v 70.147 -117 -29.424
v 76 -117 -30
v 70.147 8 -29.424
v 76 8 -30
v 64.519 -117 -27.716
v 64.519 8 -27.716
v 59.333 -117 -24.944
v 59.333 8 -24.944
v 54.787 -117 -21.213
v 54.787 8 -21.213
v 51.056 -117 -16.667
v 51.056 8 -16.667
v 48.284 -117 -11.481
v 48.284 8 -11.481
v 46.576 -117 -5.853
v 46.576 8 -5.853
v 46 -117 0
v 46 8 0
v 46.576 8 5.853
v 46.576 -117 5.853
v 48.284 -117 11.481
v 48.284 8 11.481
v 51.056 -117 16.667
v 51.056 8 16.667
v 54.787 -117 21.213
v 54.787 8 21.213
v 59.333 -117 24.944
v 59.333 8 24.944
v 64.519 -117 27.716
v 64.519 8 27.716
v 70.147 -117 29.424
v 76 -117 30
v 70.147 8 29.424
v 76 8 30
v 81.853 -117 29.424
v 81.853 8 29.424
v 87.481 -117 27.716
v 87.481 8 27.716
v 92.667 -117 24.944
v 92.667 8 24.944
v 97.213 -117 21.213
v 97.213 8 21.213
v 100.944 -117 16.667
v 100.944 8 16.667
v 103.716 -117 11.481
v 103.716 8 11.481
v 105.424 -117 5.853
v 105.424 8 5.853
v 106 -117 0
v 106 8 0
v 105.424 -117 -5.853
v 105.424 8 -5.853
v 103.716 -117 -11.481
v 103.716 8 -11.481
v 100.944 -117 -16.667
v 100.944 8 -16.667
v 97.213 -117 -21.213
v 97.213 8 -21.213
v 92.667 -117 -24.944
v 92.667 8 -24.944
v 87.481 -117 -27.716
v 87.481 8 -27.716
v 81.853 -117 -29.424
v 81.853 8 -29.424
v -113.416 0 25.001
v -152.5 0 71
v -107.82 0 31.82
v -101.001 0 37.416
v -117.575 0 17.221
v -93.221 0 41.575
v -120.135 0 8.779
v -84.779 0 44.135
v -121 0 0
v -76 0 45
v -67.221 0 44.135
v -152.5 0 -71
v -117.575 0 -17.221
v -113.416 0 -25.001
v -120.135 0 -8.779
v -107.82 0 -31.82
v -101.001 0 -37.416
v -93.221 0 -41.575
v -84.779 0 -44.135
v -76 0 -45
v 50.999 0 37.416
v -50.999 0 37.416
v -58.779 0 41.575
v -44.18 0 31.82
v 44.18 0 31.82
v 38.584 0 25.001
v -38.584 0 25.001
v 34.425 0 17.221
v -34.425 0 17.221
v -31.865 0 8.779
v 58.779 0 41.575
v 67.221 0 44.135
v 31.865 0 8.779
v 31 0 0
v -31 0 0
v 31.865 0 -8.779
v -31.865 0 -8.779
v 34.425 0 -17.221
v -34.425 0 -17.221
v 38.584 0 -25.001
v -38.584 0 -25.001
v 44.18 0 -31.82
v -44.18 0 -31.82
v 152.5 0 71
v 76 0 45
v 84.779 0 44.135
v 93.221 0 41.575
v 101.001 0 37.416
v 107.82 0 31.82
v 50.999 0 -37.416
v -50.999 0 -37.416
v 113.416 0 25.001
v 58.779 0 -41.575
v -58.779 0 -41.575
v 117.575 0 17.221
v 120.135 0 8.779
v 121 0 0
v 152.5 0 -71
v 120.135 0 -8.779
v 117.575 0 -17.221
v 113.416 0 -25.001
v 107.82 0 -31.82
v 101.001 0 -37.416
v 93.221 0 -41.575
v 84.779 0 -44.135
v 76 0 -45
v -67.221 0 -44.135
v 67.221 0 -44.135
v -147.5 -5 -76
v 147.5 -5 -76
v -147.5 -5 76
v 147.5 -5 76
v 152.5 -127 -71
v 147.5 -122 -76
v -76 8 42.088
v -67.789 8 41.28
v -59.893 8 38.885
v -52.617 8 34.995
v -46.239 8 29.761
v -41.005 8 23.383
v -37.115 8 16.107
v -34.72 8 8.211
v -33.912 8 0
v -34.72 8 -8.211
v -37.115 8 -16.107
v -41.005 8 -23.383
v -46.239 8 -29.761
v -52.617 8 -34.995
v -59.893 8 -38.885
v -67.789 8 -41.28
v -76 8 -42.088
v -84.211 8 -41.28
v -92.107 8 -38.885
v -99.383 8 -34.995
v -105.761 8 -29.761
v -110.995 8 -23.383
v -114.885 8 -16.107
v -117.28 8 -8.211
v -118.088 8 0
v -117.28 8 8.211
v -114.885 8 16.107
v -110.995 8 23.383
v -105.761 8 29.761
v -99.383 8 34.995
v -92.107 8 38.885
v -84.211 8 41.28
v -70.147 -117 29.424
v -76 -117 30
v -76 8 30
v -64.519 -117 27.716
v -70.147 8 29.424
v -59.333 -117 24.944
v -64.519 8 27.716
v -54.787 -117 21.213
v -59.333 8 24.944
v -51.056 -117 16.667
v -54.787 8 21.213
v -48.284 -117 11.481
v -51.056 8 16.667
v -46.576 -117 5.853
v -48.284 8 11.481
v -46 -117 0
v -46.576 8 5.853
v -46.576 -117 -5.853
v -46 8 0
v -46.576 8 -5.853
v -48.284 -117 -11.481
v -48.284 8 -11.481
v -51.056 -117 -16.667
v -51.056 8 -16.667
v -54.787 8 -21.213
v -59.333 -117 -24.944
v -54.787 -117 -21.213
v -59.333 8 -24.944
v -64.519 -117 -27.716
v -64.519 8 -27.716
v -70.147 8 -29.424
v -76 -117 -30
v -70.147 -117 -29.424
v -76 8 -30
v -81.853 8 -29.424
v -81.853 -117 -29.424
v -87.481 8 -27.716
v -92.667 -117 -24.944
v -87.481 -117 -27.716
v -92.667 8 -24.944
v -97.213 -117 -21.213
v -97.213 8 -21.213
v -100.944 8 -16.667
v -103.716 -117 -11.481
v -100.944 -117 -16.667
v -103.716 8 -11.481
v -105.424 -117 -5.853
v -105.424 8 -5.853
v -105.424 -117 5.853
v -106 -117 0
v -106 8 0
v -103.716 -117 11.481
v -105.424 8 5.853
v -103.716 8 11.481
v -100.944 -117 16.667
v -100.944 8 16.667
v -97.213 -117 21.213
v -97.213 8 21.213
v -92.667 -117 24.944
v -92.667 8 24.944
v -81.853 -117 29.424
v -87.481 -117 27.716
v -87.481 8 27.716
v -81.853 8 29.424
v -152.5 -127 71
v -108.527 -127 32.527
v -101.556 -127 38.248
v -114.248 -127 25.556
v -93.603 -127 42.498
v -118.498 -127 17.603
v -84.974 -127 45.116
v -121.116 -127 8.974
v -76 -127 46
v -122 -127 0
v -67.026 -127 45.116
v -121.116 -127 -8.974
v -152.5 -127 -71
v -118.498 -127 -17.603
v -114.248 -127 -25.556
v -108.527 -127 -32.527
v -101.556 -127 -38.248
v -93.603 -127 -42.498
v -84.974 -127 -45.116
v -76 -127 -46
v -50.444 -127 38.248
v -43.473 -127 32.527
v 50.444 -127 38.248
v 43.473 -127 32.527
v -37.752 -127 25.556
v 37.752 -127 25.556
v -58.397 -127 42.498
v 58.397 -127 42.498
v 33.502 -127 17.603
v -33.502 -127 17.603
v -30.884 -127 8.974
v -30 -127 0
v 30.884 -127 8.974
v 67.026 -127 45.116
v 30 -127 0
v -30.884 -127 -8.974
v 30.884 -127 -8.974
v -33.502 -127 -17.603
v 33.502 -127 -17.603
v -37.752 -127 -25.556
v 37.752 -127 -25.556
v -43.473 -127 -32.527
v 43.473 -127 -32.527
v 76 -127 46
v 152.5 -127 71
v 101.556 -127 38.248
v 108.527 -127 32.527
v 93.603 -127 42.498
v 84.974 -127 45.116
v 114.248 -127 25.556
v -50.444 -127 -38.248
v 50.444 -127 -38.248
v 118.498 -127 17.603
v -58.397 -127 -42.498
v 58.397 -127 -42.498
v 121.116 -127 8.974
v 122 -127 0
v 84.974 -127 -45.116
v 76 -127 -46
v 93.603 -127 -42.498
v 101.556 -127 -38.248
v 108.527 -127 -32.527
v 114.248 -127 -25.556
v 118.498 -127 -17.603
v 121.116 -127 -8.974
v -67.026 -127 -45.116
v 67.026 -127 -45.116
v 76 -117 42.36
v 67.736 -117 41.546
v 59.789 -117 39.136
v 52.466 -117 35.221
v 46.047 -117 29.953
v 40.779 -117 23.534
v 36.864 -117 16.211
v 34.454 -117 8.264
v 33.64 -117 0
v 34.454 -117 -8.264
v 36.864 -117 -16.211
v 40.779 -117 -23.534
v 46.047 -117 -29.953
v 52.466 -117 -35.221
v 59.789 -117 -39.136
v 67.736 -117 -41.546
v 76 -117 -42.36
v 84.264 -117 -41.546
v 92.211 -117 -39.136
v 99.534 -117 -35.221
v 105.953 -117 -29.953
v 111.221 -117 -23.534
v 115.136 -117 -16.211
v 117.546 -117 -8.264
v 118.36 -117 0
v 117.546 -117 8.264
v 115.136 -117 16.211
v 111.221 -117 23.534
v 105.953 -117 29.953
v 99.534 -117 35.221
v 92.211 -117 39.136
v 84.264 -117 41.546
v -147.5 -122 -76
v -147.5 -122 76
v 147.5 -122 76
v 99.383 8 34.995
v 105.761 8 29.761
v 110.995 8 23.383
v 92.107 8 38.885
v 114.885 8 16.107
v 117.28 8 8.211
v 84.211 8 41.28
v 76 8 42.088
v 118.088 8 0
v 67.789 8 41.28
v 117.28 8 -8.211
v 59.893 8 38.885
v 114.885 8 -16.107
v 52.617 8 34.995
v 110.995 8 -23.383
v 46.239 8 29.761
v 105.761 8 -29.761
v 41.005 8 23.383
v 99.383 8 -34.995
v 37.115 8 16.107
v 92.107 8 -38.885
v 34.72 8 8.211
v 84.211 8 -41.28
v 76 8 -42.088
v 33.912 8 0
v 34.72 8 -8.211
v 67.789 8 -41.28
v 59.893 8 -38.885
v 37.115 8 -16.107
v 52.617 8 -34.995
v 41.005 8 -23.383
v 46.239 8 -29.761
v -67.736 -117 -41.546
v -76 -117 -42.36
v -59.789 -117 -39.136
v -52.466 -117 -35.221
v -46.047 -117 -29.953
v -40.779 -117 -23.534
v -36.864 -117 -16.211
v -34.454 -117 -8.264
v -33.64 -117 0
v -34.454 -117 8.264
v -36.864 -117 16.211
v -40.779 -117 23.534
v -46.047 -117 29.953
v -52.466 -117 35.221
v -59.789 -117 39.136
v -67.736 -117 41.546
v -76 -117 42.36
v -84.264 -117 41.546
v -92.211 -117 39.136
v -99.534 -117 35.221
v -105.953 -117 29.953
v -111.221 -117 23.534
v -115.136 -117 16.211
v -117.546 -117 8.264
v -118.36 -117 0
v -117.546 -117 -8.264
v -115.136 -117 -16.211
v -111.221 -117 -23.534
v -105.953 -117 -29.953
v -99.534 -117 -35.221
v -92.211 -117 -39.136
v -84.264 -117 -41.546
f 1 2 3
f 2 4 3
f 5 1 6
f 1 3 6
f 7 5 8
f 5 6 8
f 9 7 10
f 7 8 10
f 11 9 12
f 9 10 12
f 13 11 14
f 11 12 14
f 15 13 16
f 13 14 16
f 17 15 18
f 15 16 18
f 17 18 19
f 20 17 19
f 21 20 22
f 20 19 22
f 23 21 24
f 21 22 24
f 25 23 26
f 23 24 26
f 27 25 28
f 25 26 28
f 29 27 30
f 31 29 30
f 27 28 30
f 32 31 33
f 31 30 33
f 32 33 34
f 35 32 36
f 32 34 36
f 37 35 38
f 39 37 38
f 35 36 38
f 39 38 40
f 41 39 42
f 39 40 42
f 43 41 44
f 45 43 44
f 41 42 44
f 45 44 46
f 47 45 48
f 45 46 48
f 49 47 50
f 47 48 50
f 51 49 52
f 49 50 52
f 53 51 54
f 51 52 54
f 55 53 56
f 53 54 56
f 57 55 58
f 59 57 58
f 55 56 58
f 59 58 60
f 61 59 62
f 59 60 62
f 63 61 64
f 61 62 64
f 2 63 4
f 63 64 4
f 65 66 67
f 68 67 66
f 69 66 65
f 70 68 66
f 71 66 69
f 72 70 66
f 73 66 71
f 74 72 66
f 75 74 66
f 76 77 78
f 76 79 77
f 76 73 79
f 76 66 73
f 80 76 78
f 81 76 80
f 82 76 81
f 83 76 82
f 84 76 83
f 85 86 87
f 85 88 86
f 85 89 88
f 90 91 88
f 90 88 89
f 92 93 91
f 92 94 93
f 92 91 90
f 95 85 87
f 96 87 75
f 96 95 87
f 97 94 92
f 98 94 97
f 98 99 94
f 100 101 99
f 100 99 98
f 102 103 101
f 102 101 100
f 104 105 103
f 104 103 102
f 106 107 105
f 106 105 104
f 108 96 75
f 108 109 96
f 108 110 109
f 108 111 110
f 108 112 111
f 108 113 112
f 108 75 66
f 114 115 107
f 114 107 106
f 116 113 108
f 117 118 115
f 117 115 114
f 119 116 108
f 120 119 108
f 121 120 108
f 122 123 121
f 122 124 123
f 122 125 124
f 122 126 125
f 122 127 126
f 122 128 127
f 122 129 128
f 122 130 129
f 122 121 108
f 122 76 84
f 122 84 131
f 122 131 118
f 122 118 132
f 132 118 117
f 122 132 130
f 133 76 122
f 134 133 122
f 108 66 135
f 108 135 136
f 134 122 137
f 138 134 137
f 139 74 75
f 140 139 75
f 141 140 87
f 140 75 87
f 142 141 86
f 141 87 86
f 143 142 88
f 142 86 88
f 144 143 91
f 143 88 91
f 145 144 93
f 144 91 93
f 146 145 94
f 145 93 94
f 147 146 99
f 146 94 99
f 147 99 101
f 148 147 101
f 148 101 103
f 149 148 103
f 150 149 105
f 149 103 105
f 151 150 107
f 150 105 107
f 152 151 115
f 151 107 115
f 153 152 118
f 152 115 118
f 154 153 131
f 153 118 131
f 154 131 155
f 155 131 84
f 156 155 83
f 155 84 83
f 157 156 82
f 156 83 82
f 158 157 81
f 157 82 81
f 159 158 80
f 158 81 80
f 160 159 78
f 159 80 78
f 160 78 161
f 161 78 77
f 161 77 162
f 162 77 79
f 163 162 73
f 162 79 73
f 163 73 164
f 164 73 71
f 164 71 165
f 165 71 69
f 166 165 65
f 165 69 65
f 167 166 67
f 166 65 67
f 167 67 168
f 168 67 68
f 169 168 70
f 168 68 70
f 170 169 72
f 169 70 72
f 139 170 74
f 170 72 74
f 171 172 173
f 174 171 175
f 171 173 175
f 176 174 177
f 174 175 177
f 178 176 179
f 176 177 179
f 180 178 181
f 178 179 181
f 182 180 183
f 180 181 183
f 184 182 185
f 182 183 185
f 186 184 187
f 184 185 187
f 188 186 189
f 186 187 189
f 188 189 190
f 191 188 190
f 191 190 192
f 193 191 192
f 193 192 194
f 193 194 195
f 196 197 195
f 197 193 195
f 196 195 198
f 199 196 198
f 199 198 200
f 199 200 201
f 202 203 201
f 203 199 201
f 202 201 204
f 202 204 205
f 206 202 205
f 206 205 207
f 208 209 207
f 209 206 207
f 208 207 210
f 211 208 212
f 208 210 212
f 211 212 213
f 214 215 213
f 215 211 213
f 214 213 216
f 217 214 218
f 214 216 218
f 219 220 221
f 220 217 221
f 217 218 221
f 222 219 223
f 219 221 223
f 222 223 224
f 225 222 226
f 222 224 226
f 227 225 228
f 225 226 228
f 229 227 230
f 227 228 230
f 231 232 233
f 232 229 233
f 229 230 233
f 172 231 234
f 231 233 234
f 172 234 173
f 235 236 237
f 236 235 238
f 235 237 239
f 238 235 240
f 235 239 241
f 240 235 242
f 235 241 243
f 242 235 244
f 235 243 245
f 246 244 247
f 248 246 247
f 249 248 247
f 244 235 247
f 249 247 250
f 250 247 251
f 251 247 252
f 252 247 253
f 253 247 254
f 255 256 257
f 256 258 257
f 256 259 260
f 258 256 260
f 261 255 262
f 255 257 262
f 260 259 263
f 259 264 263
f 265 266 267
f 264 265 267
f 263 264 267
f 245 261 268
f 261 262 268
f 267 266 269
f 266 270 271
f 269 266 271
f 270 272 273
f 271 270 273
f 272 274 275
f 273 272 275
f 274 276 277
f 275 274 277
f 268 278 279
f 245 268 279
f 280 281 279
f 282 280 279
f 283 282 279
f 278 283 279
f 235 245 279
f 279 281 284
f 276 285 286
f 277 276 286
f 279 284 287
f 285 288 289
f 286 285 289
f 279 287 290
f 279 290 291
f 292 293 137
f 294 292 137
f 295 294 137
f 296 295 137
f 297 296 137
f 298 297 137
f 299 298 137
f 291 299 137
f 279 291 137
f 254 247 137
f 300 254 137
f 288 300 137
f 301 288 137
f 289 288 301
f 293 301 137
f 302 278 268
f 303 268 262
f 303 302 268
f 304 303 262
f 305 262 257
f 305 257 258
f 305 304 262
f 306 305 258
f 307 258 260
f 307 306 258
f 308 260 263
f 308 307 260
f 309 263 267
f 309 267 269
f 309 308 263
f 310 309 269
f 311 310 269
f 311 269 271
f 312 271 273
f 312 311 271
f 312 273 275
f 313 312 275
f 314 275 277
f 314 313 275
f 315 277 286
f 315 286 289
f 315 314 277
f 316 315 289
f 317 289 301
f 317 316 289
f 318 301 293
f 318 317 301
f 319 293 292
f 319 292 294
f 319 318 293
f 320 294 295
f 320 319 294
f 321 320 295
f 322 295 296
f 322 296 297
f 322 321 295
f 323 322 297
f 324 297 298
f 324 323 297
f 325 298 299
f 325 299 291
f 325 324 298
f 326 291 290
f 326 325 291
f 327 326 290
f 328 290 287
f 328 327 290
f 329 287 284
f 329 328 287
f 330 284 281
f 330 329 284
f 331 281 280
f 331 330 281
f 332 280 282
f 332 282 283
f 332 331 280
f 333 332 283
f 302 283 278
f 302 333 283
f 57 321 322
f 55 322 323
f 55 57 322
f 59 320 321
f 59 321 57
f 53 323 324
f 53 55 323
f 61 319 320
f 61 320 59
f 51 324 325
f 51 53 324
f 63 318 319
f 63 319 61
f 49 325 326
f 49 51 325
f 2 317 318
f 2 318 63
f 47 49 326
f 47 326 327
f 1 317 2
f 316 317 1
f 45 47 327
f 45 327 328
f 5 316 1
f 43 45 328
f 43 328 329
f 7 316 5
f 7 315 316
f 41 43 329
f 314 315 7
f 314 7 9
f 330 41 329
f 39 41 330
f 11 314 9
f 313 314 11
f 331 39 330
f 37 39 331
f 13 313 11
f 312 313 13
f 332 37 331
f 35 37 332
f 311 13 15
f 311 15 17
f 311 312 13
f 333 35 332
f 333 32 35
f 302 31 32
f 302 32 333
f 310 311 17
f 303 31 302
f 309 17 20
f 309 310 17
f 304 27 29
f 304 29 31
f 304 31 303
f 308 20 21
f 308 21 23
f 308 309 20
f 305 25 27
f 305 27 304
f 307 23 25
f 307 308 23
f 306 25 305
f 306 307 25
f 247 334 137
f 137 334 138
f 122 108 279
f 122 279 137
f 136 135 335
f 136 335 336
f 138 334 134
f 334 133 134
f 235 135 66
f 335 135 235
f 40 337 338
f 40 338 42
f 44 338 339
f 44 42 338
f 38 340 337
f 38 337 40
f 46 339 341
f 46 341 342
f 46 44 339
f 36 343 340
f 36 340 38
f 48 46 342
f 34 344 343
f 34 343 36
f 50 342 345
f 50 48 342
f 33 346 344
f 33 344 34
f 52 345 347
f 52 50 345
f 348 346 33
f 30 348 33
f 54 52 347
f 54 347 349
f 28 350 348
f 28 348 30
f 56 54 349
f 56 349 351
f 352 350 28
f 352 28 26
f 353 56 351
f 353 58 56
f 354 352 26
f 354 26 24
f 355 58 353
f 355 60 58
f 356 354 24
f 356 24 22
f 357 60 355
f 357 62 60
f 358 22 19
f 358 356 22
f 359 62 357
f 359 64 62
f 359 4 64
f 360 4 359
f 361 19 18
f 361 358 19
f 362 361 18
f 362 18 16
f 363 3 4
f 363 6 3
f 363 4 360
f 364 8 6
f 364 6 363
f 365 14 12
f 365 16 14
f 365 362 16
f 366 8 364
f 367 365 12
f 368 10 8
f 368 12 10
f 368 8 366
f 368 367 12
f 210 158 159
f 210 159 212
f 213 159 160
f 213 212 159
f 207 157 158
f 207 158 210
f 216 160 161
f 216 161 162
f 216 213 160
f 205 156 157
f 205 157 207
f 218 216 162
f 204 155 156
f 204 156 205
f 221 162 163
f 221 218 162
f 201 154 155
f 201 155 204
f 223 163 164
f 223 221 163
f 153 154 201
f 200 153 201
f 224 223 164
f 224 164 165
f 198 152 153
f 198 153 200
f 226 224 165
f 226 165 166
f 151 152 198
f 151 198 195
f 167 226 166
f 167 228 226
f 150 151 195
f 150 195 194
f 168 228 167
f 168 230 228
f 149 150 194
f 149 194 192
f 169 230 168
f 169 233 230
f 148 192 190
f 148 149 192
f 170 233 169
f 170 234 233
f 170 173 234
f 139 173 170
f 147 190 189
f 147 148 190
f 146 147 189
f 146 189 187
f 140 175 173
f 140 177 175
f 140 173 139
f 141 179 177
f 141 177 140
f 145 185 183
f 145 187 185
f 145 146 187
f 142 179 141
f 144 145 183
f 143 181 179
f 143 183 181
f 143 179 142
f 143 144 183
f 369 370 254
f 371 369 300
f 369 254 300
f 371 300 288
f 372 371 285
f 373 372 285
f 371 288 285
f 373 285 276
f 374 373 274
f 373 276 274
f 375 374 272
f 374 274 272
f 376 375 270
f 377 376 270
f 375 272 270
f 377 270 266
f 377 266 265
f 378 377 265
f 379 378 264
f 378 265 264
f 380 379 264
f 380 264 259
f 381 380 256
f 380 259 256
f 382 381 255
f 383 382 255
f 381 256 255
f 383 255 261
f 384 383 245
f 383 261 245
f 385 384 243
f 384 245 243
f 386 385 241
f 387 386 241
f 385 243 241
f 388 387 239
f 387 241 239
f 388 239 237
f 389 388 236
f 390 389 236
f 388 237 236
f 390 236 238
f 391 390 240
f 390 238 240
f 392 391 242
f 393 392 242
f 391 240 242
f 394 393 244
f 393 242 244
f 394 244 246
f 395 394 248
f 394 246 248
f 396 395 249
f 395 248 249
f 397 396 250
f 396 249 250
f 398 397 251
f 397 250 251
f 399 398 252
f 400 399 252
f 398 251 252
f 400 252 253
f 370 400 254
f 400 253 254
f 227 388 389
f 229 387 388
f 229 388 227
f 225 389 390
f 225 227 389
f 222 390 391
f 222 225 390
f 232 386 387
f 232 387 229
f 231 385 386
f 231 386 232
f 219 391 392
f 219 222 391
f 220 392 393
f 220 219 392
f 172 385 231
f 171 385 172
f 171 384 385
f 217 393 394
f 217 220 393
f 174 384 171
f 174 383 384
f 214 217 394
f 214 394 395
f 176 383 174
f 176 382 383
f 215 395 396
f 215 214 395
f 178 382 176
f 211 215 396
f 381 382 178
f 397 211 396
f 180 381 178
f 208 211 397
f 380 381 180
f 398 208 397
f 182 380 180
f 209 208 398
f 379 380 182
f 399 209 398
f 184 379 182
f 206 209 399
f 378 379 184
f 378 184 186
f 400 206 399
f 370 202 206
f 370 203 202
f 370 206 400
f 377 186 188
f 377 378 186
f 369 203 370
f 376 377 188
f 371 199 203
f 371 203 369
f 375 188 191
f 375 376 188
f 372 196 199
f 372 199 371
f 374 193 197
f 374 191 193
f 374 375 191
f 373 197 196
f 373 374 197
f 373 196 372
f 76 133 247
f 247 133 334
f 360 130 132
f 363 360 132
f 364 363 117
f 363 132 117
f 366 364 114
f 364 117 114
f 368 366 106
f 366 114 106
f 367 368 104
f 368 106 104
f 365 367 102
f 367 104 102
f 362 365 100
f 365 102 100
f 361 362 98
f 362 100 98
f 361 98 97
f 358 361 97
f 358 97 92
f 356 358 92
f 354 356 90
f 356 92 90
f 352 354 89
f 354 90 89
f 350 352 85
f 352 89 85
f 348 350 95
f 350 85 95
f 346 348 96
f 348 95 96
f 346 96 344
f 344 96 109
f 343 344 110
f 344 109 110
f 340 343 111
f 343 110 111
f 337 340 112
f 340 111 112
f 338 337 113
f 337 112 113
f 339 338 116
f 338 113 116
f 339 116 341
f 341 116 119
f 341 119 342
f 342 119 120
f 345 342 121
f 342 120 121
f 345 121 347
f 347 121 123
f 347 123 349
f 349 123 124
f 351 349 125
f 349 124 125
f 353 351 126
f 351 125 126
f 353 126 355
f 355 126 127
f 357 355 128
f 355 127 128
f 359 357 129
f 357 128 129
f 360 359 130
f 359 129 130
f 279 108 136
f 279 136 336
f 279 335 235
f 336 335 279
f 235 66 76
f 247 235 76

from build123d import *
from OCP.BRepFilletAPI import BRepFilletAPI_MakeChamfer

# Parameters (mm, degrees)
SKETCH1_W           = 305
SKETCH1_H           = 152
BOSS_EXTRUDE1_DEPTH = 127
SKETCH2_R           = 30
CUT_EXTRUDE1_DEPTH  = 213.51176438
BOSS_EXTRUDE2_START = 8
SKETCH3_R           = 45
SKETCH3_R_2         = 30
BOSS_EXTRUDE2_DEPTH = 8
CHAMFER1_SIZE       = 2.911761874
CHAMFER1_SIZE_2     = 8
CUT_EXTRUDE2_START  = -10
SKETCH4_R           = 46
SKETCH4_R_2         = 30
CUT_EXTRUDE2_DEPTH  = 10
CHAMFER2_SIZE       = 3.639702343
CHAMFER2_SIZE_2     = 10
CHAMFER3_SIZE       = 5


with BuildPart() as part:
    # Sketch1 → Boss-Extrude1 (new body)
    with BuildSketch(Plane(origin=(0, 0, 0), x_dir=(1, 0, 0), z_dir=(0, 1, 0))):
        Rectangle(SKETCH1_W, SKETCH1_H)
    extrude(amount=-BOSS_EXTRUDE1_DEPTH)

    # Sketch2 → Cut-Extrude1 (cut, through all)
    with BuildSketch(Plane(origin=(0, 0, 0), x_dir=(1, 0, 0), z_dir=(0, 1, 0))):
        with Locations(Location((-76, 0, 0), (0, 0, 270))):
            Circle(SKETCH2_R)
        with Locations(Location((76, 0, 0), (0, 0, 90))):
            Circle(SKETCH2_R)
    extrude(amount=-CUT_EXTRUDE1_DEPTH, mode=Mode.SUBTRACT)

    # Sketch3 → Boss-Extrude2 (add)
    # profile 1 of 2: a face of its own
    with BuildSketch(Plane(origin=(0, 0, 0), x_dir=(1, 0, 0), z_dir=(0, 1, 0)).offset(BOSS_EXTRUDE2_START)):
        with Locations(Location((-76, 0, 0), (0, 0, 270))):
            Circle(SKETCH3_R)
        with Locations(Location((-76, 0, 0), (0, 0, 270))):
            Circle(SKETCH3_R_2, mode=Mode.SUBTRACT)
    # profile 2 of 2: a face of its own
    with BuildSketch(Plane(origin=(0, 0, 0), x_dir=(1, 0, 0), z_dir=(0, 1, 0)).offset(BOSS_EXTRUDE2_START)):
        with Locations(Location((76, 0, 0), (0, 0, 90))):
            Circle(SKETCH3_R)
        with Locations(Location((76, 0, 0), (0, 0, 90))):
            Circle(SKETCH3_R_2, mode=Mode.SUBTRACT)
    extrude(amount=-BOSS_EXTRUDE2_DEPTH)

    # Chamfer1
    chamfer1_edges_1 = [part.edges().sort_by_distance(p)[0] for p in [
        (-76, 8, -45),
    ]]
    chamfer1_side_1 = [part.faces().sort_by_distance(p)[0] for p in [
        (-76, 8, -44.941764763),
    ]]
    chamfer1_edges_2 = [part.edges().sort_by_distance(p)[0] for p in [
        (76, 8, 45),
    ]]
    chamfer1_side_2 = [part.faces().sort_by_distance(p)[0] for p in [
        (76, 8, 44.941764763),
    ]]
    chamfer1 = BRepFilletAPI_MakeChamfer(part.part.solid().wrapped)
    for e in chamfer1_edges_1:
        chamfer1.Add(CHAMFER1_SIZE - 0.0001, CHAMFER1_SIZE_2 - 0.0001, e.wrapped, chamfer1_side_1[0].wrapped)
    for e in chamfer1_edges_2:
        chamfer1.Add(CHAMFER1_SIZE - 0.0001, CHAMFER1_SIZE_2 - 0.0001, e.wrapped, chamfer1_side_2[0].wrapped)
    add(Compound.cast(chamfer1.Shape()), mode=Mode.REPLACE)  # a hair under: the kernel refuses the full size

    # Sketch4 → Cut-Extrude2 (cut)
    # profile 1 of 2: a face of its own
    with BuildSketch(Plane.XZ.offset(127).offset(CUT_EXTRUDE2_START)):
        with Locations(Location((-76, 0, 0), (0, 0, 270))):
            Circle(SKETCH4_R)
        with Locations(Location((-76, 0, 0), (0, 0, 90))):
            Circle(SKETCH4_R_2, mode=Mode.SUBTRACT)
    # profile 2 of 2: a face of its own
    with BuildSketch(Plane.XZ.offset(127).offset(CUT_EXTRUDE2_START)):
        with Locations(Location((76, 0, 0), (0, 0, 90))):
            Circle(SKETCH4_R)
        with Locations(Location((76, 0, 0), (0, 0, 90))):
            Circle(SKETCH4_R_2, mode=Mode.SUBTRACT)
    extrude(amount=CUT_EXTRUDE2_DEPTH, mode=Mode.SUBTRACT)

    # Chamfer2
    chamfer2_edges_1 = [part.edges().sort_by_distance(p)[0] for p in [
        (-76, -117, 46),
    ]]
    chamfer2_side_1 = [part.faces().sort_by_distance(p)[0] for p in [
        (-76, -117, 45.927205953),
    ]]
    chamfer2_edges_2 = [part.edges().sort_by_distance(p)[0] for p in [
        (76, -117, -46),
    ]]
    chamfer2_side_2 = [part.faces().sort_by_distance(p)[0] for p in [
        (76, -117.072794047, -46),
    ]]
    chamfer2 = BRepFilletAPI_MakeChamfer(part.part.solid().wrapped)
    for e in chamfer2_edges_1:
        chamfer2.Add(CHAMFER2_SIZE - 0.0001, CHAMFER2_SIZE_2 - 0.0001, e.wrapped, chamfer2_side_1[0].wrapped)
    for e in chamfer2_edges_2:
        chamfer2.Add(CHAMFER2_SIZE_2 - 0.0001, CHAMFER2_SIZE - 0.0001, e.wrapped, chamfer2_side_2[0].wrapped)
    add(Compound.cast(chamfer2.Shape()), mode=Mode.REPLACE)  # a hair under: the kernel refuses the full size

    # Chamfer3
    chamfer3_edges = [part.edges().sort_by_distance(p)[0] for p in [
        (0, -127, -76),
        (0, 0, -76),
        (0, 0, 76),
        (-152.5, -63.5, -76),
        (152.5, -63.5, -76),
        (152.5, -63.5, 76),
        (-152.5, -63.5, 76),
        (0, -127, 76),
    ]]
    chamfer(chamfer3_edges, length=CHAMFER3_SIZE)


solid = part.part
